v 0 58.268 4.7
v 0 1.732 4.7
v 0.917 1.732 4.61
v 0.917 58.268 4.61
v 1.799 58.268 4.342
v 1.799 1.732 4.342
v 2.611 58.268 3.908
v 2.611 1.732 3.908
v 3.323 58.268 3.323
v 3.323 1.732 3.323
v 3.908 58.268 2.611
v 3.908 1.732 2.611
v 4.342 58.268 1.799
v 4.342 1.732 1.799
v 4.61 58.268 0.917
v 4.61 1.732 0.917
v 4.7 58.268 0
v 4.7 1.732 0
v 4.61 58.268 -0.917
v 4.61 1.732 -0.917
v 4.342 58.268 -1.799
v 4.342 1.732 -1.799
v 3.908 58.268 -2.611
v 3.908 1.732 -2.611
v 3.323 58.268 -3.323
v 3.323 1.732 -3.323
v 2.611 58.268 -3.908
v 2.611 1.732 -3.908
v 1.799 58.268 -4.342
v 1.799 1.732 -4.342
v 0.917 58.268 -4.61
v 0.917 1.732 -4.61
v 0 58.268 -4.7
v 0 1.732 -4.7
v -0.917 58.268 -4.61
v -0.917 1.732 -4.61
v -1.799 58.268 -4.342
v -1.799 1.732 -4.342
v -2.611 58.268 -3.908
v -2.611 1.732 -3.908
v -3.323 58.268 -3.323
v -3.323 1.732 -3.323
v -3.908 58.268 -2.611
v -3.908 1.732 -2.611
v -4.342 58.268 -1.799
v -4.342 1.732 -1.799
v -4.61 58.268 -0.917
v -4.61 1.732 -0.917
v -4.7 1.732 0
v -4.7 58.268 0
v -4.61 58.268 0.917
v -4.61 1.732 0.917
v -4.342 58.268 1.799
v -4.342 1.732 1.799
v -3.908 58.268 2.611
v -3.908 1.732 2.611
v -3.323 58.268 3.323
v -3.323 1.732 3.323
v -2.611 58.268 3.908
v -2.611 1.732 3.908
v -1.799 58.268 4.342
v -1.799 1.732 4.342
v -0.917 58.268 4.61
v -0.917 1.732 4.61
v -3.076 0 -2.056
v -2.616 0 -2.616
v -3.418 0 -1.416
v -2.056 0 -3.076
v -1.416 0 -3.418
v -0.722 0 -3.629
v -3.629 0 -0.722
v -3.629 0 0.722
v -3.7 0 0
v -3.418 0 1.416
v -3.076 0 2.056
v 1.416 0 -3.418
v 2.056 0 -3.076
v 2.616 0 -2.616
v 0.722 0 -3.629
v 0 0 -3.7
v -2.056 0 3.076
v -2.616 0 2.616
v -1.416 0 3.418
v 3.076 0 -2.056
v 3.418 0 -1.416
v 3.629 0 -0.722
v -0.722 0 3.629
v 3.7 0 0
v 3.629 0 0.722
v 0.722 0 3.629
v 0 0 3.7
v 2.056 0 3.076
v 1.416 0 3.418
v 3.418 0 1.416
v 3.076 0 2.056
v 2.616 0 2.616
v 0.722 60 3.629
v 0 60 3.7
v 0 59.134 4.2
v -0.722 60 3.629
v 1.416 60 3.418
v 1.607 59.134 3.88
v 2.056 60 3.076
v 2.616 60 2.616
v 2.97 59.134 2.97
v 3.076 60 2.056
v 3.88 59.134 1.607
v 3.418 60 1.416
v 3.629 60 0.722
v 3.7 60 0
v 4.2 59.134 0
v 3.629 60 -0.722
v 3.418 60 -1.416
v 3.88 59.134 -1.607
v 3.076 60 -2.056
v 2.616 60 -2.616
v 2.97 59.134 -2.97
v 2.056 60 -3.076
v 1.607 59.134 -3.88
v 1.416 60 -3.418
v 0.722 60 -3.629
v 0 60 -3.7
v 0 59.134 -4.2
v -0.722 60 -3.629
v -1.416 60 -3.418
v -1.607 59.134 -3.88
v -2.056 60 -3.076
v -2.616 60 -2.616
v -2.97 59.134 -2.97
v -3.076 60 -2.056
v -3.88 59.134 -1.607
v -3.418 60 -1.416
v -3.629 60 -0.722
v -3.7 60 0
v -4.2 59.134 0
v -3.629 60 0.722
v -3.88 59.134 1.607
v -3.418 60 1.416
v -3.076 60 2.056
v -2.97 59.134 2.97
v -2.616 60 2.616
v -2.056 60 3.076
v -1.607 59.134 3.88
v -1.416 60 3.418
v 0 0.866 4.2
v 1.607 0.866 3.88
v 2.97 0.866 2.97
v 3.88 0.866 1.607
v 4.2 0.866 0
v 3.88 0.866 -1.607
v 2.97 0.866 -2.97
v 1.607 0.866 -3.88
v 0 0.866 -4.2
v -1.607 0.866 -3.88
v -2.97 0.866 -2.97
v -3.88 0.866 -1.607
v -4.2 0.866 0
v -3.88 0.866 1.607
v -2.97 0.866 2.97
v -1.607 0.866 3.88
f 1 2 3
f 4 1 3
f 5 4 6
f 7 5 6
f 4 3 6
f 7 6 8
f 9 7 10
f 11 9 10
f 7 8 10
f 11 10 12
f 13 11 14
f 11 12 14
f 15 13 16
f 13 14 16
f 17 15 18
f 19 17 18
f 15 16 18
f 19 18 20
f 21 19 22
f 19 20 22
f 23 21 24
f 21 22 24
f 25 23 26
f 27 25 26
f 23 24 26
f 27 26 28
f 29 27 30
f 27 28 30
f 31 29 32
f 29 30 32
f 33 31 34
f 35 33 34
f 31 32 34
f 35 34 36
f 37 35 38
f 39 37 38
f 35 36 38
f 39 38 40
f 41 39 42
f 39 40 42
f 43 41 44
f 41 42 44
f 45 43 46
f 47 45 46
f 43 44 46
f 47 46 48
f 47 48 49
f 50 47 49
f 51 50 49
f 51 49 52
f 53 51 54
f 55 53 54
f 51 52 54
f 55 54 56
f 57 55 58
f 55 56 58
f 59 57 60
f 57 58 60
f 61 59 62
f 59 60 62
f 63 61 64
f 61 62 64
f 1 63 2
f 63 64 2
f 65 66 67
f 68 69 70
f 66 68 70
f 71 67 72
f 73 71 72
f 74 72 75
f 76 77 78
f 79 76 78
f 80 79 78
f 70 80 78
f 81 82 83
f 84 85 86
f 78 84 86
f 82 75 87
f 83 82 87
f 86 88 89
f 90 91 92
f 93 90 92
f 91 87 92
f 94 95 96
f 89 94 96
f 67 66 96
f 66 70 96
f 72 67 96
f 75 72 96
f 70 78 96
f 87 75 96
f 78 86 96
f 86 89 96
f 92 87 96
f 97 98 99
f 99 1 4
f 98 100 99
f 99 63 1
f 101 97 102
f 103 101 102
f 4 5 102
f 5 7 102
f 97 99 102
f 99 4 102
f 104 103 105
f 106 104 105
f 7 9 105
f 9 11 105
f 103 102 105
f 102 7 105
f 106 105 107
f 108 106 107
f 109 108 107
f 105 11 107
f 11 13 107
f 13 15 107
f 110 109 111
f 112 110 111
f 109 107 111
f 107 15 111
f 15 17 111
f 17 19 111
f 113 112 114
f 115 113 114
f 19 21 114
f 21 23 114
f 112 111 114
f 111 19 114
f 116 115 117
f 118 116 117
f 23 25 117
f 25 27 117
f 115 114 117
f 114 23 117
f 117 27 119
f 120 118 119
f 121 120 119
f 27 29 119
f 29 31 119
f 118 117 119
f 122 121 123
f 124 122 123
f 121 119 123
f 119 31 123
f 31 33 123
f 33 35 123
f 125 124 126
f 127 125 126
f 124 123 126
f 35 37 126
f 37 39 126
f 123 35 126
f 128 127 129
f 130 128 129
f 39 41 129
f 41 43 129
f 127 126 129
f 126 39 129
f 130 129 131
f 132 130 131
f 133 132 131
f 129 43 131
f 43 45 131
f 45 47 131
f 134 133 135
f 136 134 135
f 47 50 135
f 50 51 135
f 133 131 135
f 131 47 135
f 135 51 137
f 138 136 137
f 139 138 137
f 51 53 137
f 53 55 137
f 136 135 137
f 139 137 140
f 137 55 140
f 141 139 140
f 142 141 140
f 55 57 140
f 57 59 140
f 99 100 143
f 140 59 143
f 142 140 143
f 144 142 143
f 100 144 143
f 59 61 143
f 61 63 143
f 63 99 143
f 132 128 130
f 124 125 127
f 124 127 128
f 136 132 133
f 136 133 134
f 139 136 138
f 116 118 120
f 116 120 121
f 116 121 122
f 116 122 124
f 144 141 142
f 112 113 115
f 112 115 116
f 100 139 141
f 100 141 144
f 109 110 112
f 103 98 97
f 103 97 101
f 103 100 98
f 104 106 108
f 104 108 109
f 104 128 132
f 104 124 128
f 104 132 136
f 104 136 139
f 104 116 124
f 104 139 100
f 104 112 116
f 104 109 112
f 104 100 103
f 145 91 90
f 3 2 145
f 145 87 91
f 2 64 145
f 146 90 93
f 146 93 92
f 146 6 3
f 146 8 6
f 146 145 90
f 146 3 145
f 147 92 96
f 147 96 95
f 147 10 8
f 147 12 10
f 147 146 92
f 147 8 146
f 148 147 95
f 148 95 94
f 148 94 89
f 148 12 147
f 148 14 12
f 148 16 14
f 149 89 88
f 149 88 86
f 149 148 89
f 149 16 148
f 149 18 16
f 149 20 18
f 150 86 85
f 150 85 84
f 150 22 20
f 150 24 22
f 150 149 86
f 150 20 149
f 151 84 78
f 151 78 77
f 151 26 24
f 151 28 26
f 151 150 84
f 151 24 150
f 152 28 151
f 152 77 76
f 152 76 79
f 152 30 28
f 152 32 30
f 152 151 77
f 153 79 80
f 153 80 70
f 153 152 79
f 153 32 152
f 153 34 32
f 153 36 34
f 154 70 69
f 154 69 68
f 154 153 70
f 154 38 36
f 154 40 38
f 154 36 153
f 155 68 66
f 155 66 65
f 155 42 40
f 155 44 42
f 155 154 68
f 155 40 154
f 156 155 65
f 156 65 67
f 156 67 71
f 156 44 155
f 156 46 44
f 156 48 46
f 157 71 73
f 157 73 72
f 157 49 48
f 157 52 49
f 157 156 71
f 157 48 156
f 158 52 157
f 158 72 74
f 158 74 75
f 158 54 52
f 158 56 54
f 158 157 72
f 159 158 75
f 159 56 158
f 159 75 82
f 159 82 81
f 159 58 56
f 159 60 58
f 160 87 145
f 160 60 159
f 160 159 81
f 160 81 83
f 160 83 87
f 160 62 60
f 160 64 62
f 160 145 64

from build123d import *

# Parameters (mm, degrees)
SKETCH1_R           = 4.7
BOSS_EXTRUDE1_DEPTH = 60
CHAMFER1_SIZE       = 1
CHAMFER1_SIZE2      = 1.732050808
CHAMFER3_SIZE       = 1
CHAMFER3_SIZE2      = 1.732050808


with BuildPart() as part:
    # Sketch1 → Boss-Extrude1 (new body)
    with BuildSketch(Plane(origin=(0, 0, 0), x_dir=(1, 0, 0), z_dir=(0, 1, 0))):
        with Locations(Location((0, 0, 0), (0, 0, 270))):
            Circle(SKETCH1_R)
    extrude(amount=BOSS_EXTRUDE1_DEPTH)

    # Chamfer1
    chamfer1_edges = [part.edges().sort_by_distance(p)[0] for p in [
        (0, 0, -4.7),
    ]]
    chamfer1_side = [part.faces().sort_by_distance(p)[0] for p in [
        (0, 0, 0),
    ]]
    chamfer(chamfer1_edges, length=CHAMFER1_SIZE, length2=CHAMFER1_SIZE2, reference=chamfer1_side[0])

    # Chamfer3
    chamfer3_edges = [part.edges().sort_by_distance(p)[0] for p in [
        (0, 60, -4.7),
    ]]
    chamfer3_side = [part.faces().sort_by_distance(p)[0] for p in [
        (0, 60, 0),
    ]]
    chamfer(chamfer3_edges, length=CHAMFER3_SIZE, length2=CHAMFER3_SIZE2, reference=chamfer3_side[0])


solid = part.part
